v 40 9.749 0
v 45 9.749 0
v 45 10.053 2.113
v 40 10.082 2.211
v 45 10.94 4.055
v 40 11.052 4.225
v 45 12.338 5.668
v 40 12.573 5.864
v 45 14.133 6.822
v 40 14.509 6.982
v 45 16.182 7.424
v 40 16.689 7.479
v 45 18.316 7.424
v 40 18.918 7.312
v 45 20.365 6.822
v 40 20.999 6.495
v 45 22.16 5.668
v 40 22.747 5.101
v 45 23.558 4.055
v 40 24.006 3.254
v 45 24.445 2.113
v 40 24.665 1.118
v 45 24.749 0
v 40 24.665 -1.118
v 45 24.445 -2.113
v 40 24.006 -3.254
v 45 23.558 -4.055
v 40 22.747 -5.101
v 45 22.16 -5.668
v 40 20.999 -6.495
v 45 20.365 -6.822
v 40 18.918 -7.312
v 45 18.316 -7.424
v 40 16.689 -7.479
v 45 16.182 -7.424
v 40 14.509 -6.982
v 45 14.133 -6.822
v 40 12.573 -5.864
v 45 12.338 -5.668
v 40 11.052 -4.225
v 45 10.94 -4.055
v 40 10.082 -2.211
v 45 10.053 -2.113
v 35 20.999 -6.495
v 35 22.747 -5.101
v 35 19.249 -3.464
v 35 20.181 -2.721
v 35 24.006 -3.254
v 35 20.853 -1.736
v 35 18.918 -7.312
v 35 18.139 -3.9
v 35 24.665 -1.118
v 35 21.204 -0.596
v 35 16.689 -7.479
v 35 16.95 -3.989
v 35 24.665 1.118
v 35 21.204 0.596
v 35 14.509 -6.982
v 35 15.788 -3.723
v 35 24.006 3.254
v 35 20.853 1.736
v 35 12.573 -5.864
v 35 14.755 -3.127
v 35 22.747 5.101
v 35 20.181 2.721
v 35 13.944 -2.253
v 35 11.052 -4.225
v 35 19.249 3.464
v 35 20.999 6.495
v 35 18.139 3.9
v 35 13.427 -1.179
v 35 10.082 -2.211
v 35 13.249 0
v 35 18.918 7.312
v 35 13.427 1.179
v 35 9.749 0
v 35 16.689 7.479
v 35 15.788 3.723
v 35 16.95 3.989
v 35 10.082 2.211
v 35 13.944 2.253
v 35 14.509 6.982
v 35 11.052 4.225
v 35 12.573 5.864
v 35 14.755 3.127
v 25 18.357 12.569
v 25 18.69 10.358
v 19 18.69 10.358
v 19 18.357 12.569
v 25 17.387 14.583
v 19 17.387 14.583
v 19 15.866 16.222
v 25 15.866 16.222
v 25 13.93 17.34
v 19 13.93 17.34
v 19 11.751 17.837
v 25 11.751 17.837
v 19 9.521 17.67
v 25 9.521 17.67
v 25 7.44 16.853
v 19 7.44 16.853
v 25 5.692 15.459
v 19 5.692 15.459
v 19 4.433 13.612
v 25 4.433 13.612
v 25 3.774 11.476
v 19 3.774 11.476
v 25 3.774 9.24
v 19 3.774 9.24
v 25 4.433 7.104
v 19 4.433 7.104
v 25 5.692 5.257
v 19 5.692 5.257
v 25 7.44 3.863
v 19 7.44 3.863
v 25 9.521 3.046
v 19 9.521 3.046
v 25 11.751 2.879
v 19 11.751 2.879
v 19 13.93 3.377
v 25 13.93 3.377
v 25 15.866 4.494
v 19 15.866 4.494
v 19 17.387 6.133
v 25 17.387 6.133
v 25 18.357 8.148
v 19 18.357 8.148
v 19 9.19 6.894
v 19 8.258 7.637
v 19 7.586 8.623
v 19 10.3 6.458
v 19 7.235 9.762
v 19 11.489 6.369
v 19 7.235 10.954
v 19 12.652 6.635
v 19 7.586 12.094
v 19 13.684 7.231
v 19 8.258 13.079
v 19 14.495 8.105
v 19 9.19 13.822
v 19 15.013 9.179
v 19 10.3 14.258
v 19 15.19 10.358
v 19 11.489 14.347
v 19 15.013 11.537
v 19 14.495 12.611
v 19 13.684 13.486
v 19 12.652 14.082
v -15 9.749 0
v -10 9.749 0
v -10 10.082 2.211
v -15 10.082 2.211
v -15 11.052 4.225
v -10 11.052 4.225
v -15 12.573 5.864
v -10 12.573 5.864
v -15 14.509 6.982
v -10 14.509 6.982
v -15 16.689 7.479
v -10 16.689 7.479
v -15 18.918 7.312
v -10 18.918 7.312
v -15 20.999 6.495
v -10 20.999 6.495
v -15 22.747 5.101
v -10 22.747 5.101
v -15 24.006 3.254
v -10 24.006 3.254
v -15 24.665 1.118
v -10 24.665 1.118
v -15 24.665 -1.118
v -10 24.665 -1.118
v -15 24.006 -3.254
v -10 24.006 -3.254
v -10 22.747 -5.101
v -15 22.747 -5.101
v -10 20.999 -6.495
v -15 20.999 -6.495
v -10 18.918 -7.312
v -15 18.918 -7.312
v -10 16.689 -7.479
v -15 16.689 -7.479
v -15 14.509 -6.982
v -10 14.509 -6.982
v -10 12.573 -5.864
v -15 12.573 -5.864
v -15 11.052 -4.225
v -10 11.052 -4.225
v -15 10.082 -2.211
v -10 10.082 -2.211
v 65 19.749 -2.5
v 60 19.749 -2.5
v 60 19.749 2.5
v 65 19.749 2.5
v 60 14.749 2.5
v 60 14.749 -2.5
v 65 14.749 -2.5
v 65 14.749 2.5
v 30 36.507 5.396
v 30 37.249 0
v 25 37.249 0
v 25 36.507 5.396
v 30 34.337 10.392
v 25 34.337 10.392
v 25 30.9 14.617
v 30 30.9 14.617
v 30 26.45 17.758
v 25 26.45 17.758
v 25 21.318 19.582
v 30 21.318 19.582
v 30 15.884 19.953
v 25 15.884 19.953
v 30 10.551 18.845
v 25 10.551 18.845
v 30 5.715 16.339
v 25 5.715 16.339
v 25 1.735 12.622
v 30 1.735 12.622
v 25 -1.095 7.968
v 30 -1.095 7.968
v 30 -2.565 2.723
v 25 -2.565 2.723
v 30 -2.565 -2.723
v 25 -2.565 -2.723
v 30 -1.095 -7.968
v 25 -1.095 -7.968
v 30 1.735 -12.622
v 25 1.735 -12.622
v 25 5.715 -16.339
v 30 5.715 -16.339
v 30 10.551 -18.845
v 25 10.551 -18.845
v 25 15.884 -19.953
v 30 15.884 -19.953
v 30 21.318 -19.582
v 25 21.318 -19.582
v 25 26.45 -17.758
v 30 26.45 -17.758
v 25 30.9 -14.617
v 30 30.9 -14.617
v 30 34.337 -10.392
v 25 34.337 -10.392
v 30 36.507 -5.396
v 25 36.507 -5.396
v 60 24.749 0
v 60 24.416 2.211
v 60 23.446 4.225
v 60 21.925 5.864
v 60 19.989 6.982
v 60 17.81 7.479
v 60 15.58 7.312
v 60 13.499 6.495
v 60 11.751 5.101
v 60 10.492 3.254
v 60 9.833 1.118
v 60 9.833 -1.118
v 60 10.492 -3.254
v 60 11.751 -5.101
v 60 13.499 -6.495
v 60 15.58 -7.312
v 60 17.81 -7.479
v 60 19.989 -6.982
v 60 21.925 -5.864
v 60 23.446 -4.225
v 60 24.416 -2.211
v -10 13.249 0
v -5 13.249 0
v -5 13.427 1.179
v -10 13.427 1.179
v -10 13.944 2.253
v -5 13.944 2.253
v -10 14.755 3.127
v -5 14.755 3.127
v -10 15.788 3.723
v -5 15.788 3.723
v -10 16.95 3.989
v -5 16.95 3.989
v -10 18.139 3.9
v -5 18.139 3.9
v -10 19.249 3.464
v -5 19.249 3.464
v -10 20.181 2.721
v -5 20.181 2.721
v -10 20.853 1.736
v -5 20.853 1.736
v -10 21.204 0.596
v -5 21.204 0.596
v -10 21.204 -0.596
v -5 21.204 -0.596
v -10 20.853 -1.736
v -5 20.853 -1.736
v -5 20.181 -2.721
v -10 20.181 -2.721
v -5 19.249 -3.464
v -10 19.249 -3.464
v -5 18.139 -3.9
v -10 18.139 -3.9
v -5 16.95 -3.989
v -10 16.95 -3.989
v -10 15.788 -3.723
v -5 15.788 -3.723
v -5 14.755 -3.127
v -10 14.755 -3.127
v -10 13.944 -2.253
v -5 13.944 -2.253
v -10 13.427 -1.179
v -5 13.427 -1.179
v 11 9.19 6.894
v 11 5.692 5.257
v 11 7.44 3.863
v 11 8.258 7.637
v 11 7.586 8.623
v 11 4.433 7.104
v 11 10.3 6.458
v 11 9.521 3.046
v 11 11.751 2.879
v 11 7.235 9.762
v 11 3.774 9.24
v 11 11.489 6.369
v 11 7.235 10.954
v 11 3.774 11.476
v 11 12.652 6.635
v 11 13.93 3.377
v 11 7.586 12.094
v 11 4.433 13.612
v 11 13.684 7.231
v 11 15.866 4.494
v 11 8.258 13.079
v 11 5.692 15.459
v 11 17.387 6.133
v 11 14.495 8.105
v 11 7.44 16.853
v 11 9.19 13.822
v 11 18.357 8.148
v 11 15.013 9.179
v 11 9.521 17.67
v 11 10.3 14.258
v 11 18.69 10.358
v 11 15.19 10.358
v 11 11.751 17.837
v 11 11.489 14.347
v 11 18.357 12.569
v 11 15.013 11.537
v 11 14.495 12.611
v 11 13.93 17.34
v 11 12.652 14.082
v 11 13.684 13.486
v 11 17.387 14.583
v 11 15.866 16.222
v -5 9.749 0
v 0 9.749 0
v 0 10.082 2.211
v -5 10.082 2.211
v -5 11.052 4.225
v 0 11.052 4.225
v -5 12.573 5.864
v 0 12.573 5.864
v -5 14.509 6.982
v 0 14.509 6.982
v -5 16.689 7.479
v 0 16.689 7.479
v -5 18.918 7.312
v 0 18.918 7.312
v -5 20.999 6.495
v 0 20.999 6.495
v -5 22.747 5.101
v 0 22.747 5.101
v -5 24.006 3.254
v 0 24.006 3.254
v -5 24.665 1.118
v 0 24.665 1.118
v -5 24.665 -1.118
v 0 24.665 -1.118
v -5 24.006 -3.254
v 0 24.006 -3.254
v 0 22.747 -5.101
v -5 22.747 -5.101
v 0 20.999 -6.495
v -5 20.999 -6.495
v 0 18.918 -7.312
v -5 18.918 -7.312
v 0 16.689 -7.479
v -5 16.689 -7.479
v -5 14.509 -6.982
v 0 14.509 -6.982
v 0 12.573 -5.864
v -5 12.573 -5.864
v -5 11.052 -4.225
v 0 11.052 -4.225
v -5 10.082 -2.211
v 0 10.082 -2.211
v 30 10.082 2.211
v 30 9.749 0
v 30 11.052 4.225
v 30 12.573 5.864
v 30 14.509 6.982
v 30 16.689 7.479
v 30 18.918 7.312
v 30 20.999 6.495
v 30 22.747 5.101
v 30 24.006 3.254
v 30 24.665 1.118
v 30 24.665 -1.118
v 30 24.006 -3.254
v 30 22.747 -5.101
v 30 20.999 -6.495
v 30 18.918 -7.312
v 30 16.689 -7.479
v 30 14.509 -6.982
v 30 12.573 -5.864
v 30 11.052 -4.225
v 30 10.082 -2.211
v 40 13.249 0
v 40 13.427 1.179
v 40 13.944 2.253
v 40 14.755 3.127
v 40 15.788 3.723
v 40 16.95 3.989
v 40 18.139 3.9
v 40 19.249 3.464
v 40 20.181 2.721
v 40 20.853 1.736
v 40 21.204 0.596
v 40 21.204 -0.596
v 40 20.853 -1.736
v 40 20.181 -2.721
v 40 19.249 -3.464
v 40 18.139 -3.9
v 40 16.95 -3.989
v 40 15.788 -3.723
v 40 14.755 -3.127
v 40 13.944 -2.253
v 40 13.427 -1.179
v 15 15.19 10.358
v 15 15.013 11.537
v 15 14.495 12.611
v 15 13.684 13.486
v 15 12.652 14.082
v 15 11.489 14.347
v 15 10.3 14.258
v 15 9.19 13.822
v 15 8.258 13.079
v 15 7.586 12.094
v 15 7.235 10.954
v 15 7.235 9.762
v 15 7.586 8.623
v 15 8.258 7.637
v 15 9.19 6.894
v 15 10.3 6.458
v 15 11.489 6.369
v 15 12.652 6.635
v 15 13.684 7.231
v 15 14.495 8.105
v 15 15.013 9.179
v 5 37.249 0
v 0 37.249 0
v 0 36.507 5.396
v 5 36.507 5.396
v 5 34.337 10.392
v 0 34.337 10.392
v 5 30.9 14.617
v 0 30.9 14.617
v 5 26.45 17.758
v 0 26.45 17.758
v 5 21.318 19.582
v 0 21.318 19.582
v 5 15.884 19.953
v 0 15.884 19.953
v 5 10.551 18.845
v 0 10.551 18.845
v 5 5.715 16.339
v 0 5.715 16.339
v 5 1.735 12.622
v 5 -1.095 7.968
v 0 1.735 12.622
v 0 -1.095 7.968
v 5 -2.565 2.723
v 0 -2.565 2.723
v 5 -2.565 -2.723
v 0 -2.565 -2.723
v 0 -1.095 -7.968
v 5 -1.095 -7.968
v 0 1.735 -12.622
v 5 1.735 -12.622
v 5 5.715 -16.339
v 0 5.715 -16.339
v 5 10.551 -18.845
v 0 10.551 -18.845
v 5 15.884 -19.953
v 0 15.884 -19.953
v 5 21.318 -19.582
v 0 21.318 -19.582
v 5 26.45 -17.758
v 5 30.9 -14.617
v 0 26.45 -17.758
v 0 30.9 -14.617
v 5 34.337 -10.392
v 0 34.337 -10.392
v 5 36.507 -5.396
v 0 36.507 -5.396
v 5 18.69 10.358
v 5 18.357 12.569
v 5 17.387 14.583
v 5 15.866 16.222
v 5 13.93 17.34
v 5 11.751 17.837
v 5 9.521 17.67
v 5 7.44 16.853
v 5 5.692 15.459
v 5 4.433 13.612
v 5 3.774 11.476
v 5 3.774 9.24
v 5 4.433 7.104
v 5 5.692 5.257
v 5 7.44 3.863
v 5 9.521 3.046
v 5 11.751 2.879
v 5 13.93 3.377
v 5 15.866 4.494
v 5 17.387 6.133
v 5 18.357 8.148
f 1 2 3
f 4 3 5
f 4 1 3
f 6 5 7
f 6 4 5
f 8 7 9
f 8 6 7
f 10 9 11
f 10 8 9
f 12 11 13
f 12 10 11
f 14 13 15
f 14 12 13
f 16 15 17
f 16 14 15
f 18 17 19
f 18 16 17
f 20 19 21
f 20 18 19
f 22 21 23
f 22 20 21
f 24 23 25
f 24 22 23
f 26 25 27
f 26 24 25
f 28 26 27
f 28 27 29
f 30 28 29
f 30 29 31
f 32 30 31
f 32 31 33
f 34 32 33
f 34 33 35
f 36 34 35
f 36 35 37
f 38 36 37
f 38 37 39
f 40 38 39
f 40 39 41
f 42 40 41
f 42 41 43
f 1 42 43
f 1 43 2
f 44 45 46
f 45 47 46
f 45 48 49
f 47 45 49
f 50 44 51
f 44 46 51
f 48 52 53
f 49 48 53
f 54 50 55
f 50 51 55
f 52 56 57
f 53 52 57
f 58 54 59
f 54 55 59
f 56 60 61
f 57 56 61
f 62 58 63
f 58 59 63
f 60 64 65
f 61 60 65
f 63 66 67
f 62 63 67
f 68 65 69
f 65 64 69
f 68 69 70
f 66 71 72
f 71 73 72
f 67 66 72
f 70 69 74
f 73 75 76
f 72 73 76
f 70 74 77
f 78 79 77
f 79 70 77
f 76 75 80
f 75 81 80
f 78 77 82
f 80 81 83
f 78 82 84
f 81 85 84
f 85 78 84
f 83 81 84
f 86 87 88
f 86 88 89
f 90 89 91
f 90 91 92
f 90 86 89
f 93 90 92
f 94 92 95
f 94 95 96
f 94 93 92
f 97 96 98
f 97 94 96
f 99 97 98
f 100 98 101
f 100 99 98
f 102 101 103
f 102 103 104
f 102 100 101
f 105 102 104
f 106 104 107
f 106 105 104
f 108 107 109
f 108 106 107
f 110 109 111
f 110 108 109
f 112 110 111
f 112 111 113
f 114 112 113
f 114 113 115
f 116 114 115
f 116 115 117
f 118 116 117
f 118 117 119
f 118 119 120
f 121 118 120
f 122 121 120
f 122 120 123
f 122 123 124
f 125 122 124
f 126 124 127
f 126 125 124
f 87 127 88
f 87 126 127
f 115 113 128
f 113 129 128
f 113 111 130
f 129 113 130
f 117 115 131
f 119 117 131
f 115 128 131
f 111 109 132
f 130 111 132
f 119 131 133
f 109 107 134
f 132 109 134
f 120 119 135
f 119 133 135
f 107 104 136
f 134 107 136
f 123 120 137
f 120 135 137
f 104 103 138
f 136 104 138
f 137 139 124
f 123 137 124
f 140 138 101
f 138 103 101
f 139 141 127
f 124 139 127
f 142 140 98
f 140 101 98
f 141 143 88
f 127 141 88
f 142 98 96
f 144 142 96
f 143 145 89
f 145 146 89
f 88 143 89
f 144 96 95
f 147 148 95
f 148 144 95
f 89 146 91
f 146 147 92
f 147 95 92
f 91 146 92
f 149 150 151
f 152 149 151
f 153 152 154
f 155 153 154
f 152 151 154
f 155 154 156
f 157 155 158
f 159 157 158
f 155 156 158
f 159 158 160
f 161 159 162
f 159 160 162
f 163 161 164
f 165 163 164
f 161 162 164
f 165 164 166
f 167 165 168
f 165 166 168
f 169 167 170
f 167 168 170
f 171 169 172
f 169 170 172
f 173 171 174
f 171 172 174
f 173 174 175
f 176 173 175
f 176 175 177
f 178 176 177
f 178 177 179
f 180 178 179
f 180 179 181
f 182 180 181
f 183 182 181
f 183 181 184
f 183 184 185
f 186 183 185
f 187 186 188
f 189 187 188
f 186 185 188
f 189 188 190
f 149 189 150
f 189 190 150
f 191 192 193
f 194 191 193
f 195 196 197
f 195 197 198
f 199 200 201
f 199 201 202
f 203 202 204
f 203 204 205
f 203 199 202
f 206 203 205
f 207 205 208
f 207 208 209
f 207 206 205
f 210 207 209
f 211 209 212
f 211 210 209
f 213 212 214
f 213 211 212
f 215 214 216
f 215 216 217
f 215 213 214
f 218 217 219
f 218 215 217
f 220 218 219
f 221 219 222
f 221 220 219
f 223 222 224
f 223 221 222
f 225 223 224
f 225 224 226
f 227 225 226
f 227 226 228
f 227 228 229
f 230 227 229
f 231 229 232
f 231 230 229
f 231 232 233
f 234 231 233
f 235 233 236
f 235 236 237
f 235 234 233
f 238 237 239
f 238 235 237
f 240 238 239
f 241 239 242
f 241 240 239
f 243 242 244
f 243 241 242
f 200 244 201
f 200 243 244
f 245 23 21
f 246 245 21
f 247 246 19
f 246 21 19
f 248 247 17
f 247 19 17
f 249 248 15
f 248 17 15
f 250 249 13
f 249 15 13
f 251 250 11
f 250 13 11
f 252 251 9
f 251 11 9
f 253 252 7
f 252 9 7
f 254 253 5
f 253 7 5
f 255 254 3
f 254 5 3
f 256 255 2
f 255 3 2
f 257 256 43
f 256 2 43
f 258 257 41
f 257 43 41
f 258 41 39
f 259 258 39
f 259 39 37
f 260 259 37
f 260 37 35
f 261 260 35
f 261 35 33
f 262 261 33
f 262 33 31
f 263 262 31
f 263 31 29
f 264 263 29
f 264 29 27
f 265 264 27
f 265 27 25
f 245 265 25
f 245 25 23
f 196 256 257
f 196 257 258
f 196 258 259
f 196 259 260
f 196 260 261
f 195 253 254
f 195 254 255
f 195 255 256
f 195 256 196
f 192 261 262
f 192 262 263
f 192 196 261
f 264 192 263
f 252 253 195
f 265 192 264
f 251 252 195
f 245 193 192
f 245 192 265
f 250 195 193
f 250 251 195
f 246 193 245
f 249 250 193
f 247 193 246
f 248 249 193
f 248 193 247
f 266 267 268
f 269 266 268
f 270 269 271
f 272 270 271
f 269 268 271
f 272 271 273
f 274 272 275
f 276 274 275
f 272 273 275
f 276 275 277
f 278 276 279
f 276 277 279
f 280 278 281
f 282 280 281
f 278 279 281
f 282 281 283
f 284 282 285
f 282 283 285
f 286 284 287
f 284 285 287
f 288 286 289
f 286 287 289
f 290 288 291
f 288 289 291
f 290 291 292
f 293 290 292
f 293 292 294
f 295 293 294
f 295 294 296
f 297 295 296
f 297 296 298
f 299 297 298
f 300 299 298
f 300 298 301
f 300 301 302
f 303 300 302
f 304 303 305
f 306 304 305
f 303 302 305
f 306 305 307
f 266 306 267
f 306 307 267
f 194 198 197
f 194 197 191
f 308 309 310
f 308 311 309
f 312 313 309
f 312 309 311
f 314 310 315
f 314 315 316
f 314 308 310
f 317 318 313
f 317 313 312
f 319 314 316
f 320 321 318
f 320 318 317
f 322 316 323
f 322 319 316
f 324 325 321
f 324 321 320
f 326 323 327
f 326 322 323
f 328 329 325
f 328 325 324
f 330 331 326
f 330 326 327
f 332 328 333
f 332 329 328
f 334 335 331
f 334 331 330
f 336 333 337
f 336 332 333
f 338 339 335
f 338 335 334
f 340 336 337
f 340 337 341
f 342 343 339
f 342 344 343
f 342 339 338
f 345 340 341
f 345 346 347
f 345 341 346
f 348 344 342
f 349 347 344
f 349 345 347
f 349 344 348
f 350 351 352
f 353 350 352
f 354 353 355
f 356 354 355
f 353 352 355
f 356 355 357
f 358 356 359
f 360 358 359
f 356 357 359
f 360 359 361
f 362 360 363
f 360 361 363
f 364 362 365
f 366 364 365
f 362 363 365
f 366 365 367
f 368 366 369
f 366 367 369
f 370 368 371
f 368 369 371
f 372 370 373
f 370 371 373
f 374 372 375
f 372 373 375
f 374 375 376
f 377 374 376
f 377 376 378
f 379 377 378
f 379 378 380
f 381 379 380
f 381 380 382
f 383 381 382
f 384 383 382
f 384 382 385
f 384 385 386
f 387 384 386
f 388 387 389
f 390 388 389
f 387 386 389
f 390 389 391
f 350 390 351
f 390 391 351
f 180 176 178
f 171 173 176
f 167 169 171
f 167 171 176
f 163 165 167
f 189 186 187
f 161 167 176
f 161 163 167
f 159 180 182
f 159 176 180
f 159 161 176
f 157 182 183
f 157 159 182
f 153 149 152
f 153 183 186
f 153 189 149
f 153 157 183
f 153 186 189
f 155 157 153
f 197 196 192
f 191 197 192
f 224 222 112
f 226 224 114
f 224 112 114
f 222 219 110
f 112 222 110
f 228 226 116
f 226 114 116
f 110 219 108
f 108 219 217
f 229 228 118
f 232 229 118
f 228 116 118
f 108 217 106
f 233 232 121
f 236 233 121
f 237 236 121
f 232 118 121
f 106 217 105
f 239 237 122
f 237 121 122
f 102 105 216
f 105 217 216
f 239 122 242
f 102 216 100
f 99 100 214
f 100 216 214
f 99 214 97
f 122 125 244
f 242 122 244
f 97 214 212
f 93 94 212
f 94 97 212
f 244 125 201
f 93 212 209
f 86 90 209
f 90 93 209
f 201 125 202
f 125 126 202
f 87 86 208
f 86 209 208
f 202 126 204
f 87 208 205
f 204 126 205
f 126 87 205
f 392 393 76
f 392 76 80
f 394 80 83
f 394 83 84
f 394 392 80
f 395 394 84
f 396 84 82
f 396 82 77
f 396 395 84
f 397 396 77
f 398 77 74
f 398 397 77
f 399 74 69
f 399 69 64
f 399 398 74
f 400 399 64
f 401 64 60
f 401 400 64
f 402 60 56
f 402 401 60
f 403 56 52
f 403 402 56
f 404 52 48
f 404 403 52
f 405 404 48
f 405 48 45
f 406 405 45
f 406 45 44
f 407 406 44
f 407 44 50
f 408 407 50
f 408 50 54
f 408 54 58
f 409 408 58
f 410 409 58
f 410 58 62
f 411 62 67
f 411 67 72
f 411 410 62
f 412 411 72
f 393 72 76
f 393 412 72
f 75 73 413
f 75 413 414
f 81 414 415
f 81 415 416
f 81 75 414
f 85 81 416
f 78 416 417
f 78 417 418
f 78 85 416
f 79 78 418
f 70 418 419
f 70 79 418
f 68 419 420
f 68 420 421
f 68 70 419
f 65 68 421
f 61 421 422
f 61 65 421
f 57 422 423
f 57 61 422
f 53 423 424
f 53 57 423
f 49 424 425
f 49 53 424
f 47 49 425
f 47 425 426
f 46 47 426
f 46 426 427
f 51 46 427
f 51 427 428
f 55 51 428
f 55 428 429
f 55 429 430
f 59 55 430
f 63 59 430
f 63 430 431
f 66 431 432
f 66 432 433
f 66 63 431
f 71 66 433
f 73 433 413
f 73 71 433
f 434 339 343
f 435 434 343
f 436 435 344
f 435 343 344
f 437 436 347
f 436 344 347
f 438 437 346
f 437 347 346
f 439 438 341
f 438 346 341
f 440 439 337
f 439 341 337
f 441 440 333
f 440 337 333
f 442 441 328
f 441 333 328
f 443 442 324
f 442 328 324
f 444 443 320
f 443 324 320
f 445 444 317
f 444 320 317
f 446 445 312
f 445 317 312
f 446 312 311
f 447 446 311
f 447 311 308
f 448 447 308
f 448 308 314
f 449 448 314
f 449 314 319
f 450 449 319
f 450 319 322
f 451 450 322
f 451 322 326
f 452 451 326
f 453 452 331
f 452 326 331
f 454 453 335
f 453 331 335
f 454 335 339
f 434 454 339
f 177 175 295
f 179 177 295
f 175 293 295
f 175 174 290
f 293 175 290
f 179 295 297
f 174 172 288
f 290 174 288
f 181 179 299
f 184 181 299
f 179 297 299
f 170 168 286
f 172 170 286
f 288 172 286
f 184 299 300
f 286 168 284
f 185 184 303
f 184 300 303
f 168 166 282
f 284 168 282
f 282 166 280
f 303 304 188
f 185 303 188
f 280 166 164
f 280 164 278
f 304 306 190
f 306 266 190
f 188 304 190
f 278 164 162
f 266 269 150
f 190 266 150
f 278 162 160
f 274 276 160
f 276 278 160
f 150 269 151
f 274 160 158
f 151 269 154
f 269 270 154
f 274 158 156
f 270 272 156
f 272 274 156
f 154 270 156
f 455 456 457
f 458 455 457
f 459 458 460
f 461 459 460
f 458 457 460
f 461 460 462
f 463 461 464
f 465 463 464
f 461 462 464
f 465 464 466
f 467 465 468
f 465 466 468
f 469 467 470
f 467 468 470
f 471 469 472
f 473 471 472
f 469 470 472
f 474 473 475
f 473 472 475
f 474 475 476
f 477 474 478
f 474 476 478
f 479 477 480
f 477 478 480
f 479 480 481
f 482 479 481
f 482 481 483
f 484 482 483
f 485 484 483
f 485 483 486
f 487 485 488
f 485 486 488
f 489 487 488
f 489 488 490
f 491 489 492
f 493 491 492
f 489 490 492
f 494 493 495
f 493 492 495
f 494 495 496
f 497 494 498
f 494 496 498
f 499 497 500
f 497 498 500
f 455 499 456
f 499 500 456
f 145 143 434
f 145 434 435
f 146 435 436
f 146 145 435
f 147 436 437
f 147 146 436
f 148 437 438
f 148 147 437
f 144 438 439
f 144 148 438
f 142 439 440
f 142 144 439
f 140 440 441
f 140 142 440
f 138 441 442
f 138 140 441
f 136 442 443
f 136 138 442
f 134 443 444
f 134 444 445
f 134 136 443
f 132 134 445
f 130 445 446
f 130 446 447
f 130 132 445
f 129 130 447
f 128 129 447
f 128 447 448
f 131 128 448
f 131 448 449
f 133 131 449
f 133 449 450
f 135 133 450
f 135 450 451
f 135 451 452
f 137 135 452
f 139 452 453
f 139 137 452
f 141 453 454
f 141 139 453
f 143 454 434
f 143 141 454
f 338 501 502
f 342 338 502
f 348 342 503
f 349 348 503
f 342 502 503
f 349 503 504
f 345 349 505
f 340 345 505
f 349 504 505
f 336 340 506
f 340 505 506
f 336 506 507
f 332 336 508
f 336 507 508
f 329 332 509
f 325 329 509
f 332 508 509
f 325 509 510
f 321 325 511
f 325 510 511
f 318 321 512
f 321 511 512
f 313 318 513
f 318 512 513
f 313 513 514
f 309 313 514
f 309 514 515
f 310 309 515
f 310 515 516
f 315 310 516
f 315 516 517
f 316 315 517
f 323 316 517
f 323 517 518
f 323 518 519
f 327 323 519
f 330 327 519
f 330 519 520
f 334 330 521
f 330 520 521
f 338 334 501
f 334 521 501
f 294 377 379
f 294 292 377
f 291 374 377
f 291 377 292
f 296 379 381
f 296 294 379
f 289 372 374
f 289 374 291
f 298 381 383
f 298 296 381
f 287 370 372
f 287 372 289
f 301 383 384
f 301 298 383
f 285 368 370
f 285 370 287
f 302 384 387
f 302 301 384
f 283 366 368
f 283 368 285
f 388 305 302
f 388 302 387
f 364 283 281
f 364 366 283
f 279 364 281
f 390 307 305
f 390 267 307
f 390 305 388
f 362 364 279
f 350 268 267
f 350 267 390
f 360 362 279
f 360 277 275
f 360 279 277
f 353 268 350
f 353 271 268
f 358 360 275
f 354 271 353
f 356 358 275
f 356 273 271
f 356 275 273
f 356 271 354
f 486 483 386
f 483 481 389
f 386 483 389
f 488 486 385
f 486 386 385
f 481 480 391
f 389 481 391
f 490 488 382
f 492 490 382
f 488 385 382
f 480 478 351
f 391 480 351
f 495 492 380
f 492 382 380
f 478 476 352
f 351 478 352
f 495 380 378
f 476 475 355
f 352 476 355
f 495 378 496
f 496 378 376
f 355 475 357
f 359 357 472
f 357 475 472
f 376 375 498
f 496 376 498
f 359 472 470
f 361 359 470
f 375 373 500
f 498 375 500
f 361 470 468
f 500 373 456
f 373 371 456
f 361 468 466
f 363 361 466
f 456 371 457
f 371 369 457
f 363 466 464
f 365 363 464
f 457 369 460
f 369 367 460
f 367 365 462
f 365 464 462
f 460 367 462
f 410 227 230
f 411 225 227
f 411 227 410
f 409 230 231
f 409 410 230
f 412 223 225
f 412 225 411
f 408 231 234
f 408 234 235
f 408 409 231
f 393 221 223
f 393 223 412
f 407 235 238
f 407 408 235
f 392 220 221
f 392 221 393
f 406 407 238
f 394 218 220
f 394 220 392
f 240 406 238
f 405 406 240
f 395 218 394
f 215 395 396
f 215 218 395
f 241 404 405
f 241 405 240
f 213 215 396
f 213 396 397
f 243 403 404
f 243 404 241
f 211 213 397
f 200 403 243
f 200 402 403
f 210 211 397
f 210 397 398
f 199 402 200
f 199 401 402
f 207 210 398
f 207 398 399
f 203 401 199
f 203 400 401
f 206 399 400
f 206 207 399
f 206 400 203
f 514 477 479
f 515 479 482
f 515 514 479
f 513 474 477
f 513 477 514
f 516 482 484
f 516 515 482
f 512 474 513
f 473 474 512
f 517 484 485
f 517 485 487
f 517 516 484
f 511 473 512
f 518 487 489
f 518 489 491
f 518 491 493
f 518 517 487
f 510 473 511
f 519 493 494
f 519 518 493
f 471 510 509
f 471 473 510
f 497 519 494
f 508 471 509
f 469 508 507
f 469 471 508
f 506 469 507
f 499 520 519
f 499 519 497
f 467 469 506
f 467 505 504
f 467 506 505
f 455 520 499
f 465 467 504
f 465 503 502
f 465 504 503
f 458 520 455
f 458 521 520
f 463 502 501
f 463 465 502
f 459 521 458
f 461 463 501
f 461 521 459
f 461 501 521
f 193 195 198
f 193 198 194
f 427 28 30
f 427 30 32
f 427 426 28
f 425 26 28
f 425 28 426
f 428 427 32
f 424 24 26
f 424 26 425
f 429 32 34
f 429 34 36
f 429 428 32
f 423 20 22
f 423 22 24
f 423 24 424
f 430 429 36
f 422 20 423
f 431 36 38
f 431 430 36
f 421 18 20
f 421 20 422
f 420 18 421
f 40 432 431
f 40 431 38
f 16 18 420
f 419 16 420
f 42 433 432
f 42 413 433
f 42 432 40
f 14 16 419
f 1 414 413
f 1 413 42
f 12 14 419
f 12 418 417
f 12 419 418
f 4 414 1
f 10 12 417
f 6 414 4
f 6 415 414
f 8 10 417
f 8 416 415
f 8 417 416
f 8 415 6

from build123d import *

# Parameters (mm, degrees)
F0_R      = 20
F1_DEPTH  = 5
F3_R      = 7.5
F4_DEPTH  = 5
F5_R      = 4
F6_DEPTH  = 5
F7_R      = 7.5
F7_R_2    = 4
F8_DEPTH  = 5
F2_R      = 7.5
F9_DEPTH  = 6
F10_R     = 4
F11_DEPTH = 4
F13_R     = 7.5
F14_DEPTH = 15
F15_W     = 5
F15_H     = 5
F16_DEPTH = 5


with BuildPart() as f1:
    # F0 (on Right) → F1 (new body)
    with BuildSketch(Plane.YZ):
        with Locations((17.2490278537, 0)):
            Circle(F0_R)
    extrude(amount=F1_DEPTH)

    # F3 (on face) → F4 (join)
    with BuildSketch(Plane(origin=(0, 0, 0), x_dir=(0, -1, 0), z_dir=(-1, 0, 0))):
        with Locations((-17.2490278537, 0)):
            Circle(F3_R)
    extrude(amount=F4_DEPTH)

    # F5 (on face) → F6 (join)
    with BuildSketch(Plane(origin=(-5, 0, 0), x_dir=(0, -1, 0), z_dir=(-1, 0, 0))):
        with Locations((-17.2490278537, 0)):
            Circle(F5_R)
    extrude(amount=F6_DEPTH)

    # F7 (on face) → F8 (join)
    with BuildSketch(Plane(origin=(-10, 0, 0), x_dir=(0, -1, 0), z_dir=(-1, 0, 0))):
        with Locations((-17.2490278537, 0)):
            Circle(F7_R)
        with Locations((-17.2490278537, 0)):
            Circle(F7_R_2, mode=Mode.SUBTRACT)
        with Locations((-17.2490278537, 0)):
            Circle(F7_R_2)
    extrude(amount=F8_DEPTH)

    # F2 (on face) → F9 (join)
    with BuildSketch(Plane.YZ.offset(5)):
        with Locations((11.1903151186, 10.3581851689)):
            Circle(F2_R)
    extrude(amount=F9_DEPTH)

    # F10 (on face) → F11 (join)
    with BuildSketch(Plane.YZ.offset(11)):
        with Locations((11.1903151186, 10.3581851689)):
            Circle(F10_R)
    extrude(amount=F11_DEPTH)

    # F12: F1 across face


with BuildPart() as f1_1:
    add(f1.part)
    add(f1.part.mirror(Plane(origin=(15, 11.1903151186, 10.3581851689), x_dir=(0, 1, 0), z_dir=(1, 0, 0))))

    # F13 (on face) → F14 (join)
    with BuildSketch(Plane.YZ.offset(45)):
        with Locations((17.2490278537, 0)):
            Circle(F13_R)
    extrude(amount=F14_DEPTH)

    # F15 (on face) → F16 (join)
    with BuildSketch(Plane.YZ.offset(60)):
        with Locations((17.2490278537, 0)):
            Rectangle(F15_W, F15_H)
    extrude(amount=F16_DEPTH)


solid = f1_1.part
